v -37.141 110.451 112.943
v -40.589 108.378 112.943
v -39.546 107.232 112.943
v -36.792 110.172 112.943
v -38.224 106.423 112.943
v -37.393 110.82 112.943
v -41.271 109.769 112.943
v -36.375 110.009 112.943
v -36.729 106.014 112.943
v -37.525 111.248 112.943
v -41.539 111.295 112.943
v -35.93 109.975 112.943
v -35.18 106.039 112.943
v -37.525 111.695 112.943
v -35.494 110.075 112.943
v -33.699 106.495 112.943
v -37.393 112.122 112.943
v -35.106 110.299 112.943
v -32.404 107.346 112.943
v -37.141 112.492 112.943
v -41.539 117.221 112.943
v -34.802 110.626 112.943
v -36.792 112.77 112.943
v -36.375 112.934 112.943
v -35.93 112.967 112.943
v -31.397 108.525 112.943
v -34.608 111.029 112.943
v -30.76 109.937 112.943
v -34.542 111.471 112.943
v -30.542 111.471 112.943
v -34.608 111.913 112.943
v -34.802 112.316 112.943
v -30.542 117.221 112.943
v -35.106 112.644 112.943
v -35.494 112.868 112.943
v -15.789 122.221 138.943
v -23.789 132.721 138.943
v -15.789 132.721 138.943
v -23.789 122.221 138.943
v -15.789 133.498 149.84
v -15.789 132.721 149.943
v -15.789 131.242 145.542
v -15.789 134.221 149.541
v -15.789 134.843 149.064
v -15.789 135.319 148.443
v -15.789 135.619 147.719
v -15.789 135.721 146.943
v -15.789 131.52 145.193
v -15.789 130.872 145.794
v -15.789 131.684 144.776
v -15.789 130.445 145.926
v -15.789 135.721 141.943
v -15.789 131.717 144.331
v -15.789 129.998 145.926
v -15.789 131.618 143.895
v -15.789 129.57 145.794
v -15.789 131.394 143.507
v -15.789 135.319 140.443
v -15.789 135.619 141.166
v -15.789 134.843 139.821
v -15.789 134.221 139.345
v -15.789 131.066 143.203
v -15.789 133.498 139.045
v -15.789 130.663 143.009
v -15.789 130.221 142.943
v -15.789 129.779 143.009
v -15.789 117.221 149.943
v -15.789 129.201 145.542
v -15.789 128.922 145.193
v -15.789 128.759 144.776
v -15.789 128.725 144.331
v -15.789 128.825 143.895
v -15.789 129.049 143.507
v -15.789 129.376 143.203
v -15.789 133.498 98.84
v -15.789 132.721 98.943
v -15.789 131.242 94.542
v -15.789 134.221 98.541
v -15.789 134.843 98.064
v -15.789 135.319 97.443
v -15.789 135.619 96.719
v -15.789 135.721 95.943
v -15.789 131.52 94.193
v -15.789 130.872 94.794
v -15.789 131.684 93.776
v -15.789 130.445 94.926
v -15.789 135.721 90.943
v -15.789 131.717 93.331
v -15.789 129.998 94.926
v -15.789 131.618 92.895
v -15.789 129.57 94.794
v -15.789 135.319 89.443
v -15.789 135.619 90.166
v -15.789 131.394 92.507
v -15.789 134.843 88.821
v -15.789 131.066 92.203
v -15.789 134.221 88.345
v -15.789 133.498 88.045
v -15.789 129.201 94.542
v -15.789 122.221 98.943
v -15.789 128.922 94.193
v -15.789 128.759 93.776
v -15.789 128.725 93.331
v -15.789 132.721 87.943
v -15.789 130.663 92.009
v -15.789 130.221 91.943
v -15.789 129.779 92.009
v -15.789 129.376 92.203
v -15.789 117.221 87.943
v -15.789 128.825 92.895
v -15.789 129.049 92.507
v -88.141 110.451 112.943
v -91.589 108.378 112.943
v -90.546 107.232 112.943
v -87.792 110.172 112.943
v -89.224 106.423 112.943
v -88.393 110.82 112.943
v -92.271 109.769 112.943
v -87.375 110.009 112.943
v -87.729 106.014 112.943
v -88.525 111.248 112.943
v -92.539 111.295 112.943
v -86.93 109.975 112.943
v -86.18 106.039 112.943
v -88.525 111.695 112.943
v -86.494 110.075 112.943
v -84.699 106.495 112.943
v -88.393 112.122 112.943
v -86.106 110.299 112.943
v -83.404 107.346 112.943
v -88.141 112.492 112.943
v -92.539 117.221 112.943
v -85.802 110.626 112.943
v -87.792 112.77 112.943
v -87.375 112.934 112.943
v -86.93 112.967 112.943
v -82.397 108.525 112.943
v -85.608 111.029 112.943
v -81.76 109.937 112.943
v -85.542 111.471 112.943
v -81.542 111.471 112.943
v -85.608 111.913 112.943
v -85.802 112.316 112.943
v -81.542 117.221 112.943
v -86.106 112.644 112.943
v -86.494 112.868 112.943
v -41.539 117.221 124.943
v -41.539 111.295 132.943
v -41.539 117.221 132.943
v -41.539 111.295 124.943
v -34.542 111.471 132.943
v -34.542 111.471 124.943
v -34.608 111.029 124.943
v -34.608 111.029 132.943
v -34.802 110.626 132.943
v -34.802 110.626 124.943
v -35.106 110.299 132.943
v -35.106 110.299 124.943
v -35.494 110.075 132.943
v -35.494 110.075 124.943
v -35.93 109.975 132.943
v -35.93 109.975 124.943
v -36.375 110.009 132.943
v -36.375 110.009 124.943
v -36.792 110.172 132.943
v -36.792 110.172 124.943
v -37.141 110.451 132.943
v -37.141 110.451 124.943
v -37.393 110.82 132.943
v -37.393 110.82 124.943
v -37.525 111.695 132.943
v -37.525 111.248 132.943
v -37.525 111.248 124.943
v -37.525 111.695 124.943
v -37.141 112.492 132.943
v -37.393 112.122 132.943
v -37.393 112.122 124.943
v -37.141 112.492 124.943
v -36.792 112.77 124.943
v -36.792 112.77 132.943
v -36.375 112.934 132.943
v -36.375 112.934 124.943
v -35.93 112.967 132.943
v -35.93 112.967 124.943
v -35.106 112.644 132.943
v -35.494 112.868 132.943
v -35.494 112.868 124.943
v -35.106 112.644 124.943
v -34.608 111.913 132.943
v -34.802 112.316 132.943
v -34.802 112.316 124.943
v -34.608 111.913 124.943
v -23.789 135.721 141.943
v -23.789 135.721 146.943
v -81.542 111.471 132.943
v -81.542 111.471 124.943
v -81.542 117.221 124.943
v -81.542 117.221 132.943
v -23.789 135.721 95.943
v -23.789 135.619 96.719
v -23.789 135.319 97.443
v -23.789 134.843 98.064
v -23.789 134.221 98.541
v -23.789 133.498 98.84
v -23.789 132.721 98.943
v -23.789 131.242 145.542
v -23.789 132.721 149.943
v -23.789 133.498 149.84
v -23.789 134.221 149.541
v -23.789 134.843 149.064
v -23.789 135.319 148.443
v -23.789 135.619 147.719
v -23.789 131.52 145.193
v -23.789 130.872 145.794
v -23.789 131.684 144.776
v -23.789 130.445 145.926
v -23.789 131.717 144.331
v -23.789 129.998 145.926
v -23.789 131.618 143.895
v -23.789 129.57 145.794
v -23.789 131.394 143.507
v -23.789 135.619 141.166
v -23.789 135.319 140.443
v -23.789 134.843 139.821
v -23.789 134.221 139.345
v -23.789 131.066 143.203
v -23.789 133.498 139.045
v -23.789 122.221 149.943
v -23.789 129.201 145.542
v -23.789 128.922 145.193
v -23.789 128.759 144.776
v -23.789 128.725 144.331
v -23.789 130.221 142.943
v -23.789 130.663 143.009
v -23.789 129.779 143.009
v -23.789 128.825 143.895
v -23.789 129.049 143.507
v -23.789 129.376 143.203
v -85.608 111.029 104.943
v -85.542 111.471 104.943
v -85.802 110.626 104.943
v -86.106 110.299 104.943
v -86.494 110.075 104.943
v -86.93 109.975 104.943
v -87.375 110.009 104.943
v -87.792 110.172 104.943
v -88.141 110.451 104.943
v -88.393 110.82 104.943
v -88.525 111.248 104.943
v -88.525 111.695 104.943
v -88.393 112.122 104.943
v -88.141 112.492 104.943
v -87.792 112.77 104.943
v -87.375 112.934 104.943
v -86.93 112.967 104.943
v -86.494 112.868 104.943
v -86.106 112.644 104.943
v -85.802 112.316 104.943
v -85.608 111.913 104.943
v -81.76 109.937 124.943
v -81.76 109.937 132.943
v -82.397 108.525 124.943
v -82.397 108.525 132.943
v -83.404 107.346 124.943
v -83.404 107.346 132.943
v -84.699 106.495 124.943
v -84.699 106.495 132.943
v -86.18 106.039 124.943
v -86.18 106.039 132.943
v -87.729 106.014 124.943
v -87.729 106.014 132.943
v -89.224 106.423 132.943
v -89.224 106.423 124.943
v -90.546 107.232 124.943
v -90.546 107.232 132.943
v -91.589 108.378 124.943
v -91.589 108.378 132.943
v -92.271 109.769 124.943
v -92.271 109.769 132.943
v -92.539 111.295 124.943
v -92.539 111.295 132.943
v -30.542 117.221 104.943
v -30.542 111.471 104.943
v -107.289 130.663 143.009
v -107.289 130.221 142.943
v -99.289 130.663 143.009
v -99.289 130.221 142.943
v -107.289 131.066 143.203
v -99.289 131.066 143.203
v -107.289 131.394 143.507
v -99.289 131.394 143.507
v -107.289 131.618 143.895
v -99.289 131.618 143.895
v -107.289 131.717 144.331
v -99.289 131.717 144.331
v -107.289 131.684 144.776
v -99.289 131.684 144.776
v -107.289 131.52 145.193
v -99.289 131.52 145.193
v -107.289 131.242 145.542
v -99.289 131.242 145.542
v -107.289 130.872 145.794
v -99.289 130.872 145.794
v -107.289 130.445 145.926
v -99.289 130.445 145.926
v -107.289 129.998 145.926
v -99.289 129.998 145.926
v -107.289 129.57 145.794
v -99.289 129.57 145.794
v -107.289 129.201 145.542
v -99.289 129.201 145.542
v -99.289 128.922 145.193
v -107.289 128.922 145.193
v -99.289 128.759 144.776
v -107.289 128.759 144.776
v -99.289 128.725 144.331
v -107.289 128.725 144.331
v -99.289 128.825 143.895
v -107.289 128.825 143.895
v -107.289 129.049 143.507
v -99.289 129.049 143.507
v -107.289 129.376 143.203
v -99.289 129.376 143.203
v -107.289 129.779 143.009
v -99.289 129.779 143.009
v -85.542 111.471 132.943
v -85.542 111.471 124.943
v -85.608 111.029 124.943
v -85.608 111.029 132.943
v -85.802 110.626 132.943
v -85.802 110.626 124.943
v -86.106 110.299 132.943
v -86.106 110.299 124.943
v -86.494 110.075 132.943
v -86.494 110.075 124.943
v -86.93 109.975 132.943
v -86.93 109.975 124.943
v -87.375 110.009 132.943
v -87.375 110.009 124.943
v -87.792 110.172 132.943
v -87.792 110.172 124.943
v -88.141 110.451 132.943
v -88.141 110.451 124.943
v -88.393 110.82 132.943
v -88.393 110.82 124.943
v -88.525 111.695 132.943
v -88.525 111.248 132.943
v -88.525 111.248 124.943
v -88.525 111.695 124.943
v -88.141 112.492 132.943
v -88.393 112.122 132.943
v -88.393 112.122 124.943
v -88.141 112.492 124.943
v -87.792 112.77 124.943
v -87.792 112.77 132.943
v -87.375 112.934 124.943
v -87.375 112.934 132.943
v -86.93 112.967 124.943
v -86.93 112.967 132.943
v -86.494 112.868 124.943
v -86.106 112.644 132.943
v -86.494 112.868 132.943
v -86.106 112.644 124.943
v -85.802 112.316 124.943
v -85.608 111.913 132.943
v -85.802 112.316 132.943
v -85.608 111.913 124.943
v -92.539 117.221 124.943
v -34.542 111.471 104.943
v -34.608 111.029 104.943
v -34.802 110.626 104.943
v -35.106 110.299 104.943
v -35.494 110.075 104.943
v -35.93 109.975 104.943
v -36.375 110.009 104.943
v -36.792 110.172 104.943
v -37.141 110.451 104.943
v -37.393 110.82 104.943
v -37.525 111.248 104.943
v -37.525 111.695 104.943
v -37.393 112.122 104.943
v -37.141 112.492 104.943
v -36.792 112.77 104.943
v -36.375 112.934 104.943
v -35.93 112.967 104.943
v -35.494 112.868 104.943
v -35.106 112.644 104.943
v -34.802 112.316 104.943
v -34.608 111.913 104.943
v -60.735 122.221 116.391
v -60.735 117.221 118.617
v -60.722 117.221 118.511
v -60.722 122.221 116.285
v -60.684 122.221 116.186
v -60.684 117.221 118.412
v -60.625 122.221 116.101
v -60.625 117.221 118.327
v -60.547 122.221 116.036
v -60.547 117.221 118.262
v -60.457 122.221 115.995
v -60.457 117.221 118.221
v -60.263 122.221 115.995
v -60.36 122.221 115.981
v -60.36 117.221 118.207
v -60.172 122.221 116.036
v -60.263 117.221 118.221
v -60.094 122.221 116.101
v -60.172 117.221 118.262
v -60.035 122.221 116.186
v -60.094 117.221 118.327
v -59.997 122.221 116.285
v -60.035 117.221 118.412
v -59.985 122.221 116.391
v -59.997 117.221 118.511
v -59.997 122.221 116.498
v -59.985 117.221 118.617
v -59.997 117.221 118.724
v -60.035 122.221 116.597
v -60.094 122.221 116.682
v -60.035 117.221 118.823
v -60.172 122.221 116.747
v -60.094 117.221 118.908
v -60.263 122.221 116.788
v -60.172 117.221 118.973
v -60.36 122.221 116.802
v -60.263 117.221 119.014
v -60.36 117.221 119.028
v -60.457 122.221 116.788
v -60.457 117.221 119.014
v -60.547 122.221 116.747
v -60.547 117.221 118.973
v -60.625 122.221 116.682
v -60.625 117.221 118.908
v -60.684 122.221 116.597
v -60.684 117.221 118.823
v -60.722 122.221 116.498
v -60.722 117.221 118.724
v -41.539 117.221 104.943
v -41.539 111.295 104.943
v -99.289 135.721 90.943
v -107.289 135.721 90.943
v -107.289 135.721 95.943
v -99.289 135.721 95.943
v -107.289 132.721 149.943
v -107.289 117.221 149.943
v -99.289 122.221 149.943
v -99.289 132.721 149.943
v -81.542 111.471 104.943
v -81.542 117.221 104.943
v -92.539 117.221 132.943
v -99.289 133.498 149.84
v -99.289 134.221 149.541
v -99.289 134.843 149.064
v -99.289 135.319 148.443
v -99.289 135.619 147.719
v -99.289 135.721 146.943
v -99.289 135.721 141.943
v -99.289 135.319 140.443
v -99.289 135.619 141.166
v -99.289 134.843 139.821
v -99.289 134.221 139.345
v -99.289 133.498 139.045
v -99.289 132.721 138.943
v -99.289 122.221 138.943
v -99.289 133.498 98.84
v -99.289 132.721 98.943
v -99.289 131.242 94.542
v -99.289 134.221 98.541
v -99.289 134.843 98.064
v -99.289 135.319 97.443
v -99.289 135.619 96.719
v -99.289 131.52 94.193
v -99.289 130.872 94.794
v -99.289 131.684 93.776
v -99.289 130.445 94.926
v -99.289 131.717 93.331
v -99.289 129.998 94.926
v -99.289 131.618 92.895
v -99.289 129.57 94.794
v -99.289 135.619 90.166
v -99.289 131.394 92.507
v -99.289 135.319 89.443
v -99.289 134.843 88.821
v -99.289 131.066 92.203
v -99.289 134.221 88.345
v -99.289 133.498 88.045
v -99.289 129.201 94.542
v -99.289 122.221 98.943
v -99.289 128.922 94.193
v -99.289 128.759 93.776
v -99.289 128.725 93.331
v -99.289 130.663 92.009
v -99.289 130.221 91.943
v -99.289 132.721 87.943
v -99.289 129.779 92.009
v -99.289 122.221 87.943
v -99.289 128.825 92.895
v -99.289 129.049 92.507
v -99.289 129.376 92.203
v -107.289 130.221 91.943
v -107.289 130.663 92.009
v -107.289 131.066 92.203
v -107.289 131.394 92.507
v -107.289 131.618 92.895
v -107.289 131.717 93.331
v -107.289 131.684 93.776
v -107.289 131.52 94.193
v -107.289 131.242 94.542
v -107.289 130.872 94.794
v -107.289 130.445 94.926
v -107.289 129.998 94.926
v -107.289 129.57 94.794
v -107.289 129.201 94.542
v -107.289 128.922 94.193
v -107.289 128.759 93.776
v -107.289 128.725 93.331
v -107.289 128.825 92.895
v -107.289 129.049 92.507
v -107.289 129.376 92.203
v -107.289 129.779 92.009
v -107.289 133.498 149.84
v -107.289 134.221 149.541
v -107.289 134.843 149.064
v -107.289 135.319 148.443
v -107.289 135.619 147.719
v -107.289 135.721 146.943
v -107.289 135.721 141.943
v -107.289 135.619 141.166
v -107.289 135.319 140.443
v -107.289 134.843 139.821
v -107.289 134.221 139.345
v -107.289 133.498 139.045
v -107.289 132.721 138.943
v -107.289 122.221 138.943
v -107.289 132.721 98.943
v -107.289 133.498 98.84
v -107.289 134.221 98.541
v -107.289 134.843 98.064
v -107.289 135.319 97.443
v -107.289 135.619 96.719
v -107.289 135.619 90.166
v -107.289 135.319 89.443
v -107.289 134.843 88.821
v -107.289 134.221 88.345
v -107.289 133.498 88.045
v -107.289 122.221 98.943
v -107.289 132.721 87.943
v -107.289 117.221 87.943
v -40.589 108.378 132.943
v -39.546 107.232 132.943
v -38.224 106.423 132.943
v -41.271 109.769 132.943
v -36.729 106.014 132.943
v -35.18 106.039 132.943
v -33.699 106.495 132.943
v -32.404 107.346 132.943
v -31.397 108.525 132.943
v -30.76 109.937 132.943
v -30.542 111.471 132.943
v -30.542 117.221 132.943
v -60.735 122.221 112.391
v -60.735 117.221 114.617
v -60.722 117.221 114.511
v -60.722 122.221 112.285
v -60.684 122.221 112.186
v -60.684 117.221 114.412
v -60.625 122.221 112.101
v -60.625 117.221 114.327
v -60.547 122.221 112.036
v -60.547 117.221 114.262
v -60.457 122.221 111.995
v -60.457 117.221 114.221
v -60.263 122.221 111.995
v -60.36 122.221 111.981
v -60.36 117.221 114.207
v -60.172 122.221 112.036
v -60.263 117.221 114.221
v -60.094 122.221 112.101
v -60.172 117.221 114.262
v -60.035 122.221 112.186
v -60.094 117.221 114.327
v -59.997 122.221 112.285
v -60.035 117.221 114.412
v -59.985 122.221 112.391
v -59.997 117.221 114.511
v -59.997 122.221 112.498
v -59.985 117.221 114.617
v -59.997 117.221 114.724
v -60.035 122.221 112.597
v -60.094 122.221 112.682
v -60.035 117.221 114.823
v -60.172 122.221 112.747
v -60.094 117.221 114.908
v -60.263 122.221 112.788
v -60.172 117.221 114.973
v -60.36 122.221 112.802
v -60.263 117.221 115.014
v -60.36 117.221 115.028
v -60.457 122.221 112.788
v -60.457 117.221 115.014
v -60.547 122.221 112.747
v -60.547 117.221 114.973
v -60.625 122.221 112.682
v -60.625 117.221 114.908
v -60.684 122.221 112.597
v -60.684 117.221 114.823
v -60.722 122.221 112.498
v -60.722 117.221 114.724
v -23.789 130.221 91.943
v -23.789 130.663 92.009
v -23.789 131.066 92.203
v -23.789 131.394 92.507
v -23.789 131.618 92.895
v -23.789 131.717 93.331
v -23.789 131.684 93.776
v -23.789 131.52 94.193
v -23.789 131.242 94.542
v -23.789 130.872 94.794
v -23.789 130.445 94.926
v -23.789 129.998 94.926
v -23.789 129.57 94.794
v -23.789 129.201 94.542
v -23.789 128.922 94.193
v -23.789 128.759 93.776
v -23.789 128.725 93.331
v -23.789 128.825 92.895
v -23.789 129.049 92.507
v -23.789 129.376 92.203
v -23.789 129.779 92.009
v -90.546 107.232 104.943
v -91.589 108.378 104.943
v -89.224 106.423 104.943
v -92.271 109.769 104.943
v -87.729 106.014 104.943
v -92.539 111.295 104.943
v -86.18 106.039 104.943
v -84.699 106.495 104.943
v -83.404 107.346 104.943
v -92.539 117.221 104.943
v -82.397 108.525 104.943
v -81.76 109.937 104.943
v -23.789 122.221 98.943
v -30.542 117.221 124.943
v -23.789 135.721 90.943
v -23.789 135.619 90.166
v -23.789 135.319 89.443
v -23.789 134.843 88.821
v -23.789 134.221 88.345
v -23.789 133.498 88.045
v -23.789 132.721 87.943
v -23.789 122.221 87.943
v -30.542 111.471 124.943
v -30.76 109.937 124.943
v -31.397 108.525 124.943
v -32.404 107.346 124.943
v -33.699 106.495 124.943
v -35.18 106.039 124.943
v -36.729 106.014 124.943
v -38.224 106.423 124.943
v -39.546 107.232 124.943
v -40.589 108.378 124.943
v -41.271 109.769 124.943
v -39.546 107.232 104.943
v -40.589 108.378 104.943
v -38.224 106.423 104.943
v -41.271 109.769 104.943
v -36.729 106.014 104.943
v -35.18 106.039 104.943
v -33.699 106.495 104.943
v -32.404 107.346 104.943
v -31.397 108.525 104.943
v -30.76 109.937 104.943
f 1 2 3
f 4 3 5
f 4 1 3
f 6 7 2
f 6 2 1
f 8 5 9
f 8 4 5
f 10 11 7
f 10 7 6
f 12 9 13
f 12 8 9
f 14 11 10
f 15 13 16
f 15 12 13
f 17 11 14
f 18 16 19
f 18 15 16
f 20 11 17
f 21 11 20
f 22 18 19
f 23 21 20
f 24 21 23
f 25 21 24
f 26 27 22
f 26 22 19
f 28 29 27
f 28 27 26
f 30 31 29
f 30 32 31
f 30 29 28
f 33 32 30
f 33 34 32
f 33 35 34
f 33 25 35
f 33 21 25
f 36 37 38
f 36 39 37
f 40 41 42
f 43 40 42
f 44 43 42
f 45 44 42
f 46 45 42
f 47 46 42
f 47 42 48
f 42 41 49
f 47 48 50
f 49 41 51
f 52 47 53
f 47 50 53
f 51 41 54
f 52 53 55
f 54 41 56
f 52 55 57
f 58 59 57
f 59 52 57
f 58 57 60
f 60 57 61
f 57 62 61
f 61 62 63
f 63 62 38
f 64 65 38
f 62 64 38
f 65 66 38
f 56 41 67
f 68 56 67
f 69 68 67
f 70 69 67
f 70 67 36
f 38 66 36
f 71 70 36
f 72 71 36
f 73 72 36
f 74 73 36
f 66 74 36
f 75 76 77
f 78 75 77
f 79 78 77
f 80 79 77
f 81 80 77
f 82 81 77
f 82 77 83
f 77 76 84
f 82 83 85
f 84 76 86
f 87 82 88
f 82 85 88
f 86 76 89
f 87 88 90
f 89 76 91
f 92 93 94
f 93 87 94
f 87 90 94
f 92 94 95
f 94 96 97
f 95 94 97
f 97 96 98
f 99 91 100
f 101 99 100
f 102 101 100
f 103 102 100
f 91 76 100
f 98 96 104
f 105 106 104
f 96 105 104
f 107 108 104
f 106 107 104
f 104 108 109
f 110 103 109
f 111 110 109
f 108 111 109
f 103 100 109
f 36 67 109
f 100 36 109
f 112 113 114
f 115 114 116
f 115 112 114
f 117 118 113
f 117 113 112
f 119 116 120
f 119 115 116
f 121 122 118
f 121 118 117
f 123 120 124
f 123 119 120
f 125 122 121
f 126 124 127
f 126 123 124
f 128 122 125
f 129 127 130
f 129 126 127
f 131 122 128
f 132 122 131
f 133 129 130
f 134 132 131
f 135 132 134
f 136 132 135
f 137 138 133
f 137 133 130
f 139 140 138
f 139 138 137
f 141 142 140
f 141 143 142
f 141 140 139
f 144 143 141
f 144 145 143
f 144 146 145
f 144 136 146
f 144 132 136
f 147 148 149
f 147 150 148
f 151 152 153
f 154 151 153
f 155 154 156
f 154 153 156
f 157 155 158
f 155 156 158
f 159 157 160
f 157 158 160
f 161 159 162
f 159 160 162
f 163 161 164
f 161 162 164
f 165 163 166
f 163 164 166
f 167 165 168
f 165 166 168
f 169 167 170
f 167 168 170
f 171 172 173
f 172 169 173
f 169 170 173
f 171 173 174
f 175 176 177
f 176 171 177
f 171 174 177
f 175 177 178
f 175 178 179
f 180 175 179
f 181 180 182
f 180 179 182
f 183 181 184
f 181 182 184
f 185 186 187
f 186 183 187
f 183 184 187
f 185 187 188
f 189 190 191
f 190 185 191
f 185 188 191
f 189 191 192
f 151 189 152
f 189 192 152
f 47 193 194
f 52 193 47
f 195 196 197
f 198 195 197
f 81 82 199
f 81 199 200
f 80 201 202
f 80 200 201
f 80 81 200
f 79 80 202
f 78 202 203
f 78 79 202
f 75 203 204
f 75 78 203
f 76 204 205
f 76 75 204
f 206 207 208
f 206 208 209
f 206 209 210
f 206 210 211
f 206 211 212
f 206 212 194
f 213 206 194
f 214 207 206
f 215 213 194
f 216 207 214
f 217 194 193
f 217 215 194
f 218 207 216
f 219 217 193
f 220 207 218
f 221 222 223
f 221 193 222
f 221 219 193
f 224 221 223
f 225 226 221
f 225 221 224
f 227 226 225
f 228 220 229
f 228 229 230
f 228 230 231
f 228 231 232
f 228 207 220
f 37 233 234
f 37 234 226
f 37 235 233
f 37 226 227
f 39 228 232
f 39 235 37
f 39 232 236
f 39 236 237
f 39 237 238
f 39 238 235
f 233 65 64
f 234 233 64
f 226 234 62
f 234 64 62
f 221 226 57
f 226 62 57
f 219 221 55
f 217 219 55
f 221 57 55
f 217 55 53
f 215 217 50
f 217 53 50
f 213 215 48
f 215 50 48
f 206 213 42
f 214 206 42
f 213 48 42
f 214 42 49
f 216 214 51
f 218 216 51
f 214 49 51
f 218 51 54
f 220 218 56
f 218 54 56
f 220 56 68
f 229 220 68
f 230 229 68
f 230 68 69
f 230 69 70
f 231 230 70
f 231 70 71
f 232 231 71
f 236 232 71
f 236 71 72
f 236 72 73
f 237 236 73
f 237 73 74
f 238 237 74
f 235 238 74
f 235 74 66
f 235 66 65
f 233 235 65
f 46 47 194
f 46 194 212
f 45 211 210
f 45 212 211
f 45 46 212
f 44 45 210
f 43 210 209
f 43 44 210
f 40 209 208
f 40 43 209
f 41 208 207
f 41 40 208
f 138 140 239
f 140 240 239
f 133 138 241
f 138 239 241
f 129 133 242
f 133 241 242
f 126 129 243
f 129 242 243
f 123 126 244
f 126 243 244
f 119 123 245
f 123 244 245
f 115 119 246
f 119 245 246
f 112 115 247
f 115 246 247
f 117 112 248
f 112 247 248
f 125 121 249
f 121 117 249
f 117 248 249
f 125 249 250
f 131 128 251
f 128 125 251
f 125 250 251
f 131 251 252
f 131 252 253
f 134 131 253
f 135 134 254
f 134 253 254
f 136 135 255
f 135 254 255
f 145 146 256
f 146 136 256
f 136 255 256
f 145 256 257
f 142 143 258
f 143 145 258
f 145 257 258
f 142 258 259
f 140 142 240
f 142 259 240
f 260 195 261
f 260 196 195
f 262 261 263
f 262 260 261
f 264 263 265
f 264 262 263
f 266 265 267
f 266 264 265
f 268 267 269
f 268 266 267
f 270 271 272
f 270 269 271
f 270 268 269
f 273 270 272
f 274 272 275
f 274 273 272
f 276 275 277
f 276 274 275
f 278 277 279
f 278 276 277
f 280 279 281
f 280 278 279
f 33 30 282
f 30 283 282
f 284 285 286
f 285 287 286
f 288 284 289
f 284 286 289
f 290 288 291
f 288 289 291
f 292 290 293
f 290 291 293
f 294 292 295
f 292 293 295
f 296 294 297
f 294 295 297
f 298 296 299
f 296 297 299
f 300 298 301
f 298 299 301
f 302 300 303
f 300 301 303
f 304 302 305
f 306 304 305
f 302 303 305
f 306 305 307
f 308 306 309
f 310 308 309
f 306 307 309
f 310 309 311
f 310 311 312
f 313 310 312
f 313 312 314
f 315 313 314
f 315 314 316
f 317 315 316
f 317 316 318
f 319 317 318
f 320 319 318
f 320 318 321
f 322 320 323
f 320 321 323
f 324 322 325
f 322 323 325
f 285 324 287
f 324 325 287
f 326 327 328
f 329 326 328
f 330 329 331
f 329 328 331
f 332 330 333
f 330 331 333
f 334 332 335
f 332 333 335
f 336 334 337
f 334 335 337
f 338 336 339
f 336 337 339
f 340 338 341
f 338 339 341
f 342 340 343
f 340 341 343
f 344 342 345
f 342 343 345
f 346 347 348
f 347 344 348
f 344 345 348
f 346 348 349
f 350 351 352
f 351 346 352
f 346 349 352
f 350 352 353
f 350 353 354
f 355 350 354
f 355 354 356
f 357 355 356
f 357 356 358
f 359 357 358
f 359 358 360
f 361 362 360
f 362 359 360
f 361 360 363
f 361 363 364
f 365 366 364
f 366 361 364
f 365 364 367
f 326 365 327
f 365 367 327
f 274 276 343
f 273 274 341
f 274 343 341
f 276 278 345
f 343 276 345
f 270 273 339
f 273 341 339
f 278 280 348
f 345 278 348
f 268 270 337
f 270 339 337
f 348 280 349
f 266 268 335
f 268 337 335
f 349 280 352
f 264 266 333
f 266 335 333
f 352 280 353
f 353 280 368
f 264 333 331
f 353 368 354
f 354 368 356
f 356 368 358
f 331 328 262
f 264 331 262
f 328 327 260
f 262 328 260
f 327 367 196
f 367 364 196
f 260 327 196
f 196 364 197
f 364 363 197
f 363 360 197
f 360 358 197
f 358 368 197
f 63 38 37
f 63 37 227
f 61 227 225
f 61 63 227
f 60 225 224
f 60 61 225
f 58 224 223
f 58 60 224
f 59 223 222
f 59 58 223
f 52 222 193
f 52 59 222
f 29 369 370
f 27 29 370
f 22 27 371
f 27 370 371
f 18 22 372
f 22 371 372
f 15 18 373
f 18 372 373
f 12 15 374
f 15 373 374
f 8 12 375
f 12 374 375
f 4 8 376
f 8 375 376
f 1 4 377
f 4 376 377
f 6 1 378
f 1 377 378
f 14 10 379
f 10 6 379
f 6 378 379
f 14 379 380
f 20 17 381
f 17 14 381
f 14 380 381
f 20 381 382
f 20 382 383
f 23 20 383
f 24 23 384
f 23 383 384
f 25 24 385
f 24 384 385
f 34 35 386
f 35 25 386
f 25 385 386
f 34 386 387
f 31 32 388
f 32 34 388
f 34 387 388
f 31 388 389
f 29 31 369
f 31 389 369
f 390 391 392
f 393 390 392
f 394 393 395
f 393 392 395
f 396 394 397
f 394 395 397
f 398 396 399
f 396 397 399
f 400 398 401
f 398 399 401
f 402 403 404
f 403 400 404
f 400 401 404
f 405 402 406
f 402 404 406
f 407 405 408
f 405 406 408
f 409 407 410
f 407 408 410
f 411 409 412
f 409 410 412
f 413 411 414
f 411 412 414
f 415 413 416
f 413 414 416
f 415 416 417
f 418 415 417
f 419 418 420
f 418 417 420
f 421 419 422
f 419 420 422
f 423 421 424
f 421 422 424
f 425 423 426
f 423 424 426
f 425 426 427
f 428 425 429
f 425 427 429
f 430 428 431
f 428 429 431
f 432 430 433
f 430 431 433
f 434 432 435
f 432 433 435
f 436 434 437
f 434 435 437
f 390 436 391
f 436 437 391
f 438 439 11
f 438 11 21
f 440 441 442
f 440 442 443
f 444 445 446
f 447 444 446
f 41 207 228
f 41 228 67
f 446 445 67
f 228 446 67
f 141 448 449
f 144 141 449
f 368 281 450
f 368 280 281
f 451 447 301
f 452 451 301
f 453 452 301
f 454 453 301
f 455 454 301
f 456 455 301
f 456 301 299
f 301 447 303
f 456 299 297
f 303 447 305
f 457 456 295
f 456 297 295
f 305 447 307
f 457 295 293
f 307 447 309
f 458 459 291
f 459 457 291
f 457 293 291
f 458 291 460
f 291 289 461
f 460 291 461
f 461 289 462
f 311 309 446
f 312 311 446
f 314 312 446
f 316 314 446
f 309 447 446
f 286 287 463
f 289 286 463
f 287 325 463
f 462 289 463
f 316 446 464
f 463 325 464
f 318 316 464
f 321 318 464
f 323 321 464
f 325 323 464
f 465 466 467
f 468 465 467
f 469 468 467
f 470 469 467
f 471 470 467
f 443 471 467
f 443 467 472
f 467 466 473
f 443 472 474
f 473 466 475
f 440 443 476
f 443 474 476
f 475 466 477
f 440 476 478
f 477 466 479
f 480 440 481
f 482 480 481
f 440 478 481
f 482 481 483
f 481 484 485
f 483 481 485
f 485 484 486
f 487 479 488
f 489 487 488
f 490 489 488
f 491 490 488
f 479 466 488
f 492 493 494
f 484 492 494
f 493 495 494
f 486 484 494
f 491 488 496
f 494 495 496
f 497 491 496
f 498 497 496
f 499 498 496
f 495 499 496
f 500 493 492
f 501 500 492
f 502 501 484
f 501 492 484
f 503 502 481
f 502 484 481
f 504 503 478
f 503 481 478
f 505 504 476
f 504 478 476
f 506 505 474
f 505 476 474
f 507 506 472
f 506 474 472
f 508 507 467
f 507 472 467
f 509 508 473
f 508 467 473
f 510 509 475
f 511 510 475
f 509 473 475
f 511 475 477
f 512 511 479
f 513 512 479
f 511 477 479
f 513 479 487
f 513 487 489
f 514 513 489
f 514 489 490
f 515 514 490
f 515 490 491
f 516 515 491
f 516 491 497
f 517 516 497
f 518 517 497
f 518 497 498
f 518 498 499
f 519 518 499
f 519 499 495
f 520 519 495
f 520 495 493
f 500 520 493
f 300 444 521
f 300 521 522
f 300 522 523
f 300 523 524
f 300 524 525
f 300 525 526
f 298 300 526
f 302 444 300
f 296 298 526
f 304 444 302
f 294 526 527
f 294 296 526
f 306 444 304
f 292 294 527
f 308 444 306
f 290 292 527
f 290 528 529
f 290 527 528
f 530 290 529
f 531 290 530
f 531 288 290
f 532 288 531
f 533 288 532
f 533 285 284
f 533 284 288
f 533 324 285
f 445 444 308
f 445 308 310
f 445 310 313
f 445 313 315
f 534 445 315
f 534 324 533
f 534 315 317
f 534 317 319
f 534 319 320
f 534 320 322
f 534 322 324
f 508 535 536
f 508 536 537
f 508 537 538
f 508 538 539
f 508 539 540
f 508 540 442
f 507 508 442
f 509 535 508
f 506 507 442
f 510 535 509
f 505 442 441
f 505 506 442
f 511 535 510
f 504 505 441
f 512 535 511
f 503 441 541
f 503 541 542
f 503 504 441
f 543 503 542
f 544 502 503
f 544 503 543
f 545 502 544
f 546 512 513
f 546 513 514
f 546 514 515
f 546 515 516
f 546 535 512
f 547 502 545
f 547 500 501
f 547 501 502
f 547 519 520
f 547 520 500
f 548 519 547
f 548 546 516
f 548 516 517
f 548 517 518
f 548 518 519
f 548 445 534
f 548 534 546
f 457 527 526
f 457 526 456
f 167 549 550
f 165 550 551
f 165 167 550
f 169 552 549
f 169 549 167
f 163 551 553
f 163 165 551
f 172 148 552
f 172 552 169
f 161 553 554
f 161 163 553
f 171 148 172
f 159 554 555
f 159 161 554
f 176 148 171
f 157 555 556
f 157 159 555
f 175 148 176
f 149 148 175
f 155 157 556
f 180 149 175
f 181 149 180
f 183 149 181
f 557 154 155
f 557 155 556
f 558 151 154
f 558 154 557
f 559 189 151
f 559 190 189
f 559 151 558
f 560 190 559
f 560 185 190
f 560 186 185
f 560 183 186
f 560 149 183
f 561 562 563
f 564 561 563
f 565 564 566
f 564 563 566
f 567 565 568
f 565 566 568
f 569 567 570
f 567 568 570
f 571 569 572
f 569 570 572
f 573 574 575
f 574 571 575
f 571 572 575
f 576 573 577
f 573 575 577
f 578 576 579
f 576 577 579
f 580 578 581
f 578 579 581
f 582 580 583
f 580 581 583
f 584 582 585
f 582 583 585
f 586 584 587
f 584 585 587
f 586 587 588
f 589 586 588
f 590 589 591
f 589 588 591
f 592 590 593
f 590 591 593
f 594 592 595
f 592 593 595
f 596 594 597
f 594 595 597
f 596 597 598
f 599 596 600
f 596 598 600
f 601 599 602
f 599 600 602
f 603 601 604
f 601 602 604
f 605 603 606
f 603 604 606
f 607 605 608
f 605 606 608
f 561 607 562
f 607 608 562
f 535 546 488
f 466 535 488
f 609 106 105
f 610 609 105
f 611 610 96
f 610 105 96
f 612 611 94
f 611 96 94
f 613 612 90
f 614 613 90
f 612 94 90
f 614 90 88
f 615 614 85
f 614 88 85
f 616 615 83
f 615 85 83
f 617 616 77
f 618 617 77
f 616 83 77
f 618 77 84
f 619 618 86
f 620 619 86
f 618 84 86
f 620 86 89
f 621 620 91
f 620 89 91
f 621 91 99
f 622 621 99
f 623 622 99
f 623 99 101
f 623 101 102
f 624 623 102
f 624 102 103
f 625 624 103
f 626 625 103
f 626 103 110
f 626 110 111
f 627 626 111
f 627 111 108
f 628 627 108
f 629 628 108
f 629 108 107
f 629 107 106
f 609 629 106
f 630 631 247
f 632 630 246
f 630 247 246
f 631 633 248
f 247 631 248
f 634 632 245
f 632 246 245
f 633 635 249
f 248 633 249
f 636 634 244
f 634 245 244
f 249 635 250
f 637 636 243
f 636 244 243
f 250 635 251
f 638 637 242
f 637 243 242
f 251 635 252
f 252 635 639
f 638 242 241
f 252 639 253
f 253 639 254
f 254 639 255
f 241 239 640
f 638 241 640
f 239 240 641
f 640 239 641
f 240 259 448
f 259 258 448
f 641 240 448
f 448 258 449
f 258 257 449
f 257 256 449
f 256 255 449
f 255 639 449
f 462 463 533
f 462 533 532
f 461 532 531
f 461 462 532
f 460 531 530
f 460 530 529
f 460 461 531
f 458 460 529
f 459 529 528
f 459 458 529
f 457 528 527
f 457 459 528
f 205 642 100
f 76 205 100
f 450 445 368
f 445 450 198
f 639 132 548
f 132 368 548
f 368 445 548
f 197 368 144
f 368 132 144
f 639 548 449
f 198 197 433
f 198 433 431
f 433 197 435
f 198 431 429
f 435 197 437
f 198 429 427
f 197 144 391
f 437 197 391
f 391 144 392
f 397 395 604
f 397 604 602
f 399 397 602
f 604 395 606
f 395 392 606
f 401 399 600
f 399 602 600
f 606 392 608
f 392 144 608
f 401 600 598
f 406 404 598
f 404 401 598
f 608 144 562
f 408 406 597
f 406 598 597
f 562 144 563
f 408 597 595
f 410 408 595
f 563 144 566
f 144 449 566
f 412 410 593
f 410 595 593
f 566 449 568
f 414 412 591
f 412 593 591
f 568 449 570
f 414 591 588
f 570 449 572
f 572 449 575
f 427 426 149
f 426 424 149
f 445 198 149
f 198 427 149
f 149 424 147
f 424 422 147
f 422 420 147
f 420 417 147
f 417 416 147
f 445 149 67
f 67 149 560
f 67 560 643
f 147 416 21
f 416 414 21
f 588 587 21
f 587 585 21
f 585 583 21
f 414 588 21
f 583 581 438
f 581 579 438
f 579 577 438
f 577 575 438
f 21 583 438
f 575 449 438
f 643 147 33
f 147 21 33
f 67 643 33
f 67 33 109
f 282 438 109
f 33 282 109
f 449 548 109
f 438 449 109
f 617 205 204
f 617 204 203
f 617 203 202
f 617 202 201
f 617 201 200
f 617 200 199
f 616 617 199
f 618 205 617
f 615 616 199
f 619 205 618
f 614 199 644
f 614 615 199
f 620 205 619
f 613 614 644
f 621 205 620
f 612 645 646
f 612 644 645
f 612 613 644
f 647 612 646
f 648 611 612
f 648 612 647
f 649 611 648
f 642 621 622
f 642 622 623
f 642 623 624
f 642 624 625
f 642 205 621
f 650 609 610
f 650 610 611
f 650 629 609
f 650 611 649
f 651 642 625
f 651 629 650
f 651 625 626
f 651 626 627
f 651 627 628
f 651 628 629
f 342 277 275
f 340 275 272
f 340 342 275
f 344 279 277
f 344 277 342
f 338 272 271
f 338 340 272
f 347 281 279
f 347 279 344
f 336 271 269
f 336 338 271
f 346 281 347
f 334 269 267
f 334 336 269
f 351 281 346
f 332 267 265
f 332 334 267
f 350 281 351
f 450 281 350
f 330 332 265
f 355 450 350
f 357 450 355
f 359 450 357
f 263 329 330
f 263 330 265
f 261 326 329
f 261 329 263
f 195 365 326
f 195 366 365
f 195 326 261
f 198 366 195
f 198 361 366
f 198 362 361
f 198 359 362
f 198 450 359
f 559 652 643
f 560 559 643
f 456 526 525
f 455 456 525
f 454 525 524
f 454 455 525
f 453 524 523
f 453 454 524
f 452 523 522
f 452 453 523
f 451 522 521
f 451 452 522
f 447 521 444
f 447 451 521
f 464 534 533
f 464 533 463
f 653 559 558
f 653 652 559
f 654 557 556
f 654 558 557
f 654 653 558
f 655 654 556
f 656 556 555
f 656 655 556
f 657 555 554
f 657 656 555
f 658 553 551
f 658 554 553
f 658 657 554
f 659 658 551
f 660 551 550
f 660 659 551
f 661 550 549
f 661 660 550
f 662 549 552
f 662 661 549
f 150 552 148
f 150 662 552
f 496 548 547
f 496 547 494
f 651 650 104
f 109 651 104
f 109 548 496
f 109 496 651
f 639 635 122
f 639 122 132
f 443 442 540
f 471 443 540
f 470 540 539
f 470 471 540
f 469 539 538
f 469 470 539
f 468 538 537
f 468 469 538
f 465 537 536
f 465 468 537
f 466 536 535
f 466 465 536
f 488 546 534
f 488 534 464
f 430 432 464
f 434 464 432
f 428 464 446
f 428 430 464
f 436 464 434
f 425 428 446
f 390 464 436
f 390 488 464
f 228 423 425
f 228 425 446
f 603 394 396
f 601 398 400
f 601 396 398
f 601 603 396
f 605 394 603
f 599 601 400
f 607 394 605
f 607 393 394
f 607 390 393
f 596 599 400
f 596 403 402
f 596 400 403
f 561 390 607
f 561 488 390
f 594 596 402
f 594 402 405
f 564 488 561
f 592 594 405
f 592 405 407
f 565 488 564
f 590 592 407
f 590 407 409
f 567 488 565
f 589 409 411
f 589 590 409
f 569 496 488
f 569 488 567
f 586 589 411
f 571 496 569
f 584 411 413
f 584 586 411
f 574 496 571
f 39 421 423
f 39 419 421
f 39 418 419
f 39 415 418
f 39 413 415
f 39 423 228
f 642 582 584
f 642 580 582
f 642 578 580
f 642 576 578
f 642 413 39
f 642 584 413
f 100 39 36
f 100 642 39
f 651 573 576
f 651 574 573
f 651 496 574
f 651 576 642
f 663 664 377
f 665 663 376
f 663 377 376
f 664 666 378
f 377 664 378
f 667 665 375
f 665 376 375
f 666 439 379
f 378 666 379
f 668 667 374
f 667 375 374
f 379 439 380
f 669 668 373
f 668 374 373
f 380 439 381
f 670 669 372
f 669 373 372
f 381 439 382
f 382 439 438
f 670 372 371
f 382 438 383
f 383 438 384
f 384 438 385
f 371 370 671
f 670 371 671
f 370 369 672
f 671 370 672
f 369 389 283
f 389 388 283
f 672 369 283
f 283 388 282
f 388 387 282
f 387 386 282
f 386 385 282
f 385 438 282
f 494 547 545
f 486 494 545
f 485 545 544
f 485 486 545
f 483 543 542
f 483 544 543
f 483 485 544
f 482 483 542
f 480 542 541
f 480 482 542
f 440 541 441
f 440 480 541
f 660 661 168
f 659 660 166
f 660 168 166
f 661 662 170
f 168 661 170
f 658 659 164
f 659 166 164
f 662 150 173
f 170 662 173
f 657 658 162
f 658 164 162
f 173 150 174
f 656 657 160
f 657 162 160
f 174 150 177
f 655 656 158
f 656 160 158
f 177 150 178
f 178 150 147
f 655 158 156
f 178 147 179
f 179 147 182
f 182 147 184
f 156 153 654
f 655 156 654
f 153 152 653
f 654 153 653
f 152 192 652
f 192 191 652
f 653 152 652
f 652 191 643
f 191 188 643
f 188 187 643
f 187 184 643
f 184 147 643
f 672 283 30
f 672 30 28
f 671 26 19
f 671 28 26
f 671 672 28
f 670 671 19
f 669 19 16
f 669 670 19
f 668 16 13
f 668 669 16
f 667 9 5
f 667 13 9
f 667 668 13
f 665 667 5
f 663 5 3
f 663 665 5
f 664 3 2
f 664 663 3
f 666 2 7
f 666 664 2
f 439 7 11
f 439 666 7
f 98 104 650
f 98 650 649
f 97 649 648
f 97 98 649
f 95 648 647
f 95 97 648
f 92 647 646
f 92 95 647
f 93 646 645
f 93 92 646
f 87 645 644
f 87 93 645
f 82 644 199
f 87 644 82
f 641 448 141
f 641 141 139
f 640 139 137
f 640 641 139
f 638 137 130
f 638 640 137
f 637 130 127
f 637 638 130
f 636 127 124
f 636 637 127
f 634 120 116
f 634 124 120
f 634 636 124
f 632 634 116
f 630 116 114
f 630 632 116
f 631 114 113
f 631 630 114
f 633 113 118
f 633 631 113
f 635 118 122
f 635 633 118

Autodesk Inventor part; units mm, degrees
ref_plane "YZ Plane" through (0, 0, 0) normal (1, 0, 0) x (0, 1, 0)
ref_plane "XZ Plane" through (0, 0, 0) normal (0, 1, 0) x (-1, 0, 0)
ref_plane "XY Plane" through (0, 0, 0) normal (0, 0, 1) x (1, 0, 0)
ref_plane "Work Plane1" through (-106.5416, 98.4713, 124.9427) normal (0, 0, 1) x (1, 0, 0)
sketch "Sketch1" plane through (-106.5416, 98.4713, 124.9427) normal (0, 0, 1) x (1, 0, 0)
  circle A0 centre (19.5, 13) radius 1.5 projected
  arc A1 (52.5, 10.25) -> (37.5, 10.25) centre (45, 10.25) ccw projected
  circle A2 centre (19.5, 13) radius 5.5 construction
  line L0 (45, 10.25) -> (45, 17.75) construction
  line L1 (45, 17.75) -> (45, 23.75) construction
  line L2 (45, 23.75) -> (19.5, 23.75) construction
  arc A3 (14.0371, 13.6378) -> (25, 13) centre (19.5, 13) ccw
  line L3 (25, 13) -> (25, 23.75)
  circle A4 centre (19.5, 13) radius 1.5
  line L4 (14.0028, 12.8238) -> (14.0028, 23.75)
  line L5 (14.0028, 23.75) -> (25, 23.75)
  point P0 (106.5416, -98.4713)
  point P1 (14.0469, 12.2829)
  dimension "d0" = 11
  dimension "d4" = 10.75
extrude "Extrusion1" add sketch "Sketch1" along normal blind 8
pattern_linear "Rectangular Pattern2" count 2 spacing 51 along (1, 0, 0) count 2 spacing 20 along (0, 0, -1) of "Extrusion1"
sketch "Sketch3" plane through (-92.5388, 122.2213, 124.9427) normal (0, 1, 0) x (1, 0, 0)
  line L0 (0, 20) -> (61.9972, 20) construction
  line L1 (0, 20) -> (0, -8) construction
  line L2 (0, 6) -> (86.2224, 6) construction
  line L3 (31, 37) -> (31, -25) construction
  line L4 (31, -25) -> (-14.75, -25) construction
  line L5 (31, -25) -> (76.75, -25) construction
  line L6 (76.75, -25) -> (76.75, 37)
  line L7 (76.75, 37) -> (-14.75, 37)
  line L8 (-14.75, 37) -> (-14.75, -25)
  line L9 (-14.75, -25) -> (76.75, -25)
  point P0 (92.5388, 124.9427)
  dimension "d29" = 45.75
  dimension "d30" = 45.75
  dimension "d31" = 62
extrude "Extrusion3" add sketch "Sketch3" against normal blind 5
ref_plane "Work Plane2" through (-60.8166, 113.6367, 119.7132) normal (0, 0.9135, -0.4067) x (-1, 0, 0)
sketch "Sketch4" plane through (-60.8166, 113.6367, 119.7132) normal (0, 0.9135, -0.4067) x (-1, 0, 0)
  circle A0 centre (-0.457, 0.457) radius 0.457 projected
  circle A1 centre (-0.457, 0.457) radius 0.457
  circle A2 centre (-0.457, 0.457) radius 0.375
  point P0 (-60.8166, -155.5837)
  dimension "d32" = 0.75
extrude "Extrusion4" cut sketch "Sketch4" along normal blind 15 contours A2
pattern_linear "Rectangular Pattern3" count 2 spacing 4 along (0, 0, -1) of "Extrusion4"
sketch "Sketch5" plane through (-107.2888, 122.2213, 149.9427) normal (0, 1, 0) x (1, 0, 0)
  line L0 (0, 0) -> (0, 62) projected
  line L1 (0, 62) -> (91.5, 62) projected
  line L2 (0, 62) -> (0, 51)
  line L3 (0, 51) -> (8, 51)
  line L4 (8, 51) -> (8, 62)
  line L5 (0, 62) -> (8, 62)
  point P0 (107.2888, 149.9427)
  dimension "d38" = 11
  dimension "d39" = 8
extrude "Extrusion5" add sketch "Sketch5" along normal blind 13.5
sketch "Sketch6" plane through (-99.2888, 122.2213, 98.9427) normal (1, 0, 0) x (0, 0, -1)
  line L0 (11, 0) -> (11, 13.5) projected
  line L1 (0, 13.5) -> (11, 13.5) projected
  circle A0 centre (5.5, 8) radius 1.5
  dimension "d42" = 3
  dimension "d43" = 5.5
  dimension "d44" = 5.5
extrude "Extrusion6" cut sketch "Sketch6" against normal blind 24.6
fillet "Fillet1" radius 3 2 edges at (-103.2888, 135.7213, 98.9427) (-103.2888, 135.7213, 87.9427)
pattern_linear "Rectangular Pattern4" count 2 spacing 51 along (0, 0, 1) count 2 spacing 83.5 along (1, 0, 0) of "Extrusion5", "Fillet1", "Extrusion6"
